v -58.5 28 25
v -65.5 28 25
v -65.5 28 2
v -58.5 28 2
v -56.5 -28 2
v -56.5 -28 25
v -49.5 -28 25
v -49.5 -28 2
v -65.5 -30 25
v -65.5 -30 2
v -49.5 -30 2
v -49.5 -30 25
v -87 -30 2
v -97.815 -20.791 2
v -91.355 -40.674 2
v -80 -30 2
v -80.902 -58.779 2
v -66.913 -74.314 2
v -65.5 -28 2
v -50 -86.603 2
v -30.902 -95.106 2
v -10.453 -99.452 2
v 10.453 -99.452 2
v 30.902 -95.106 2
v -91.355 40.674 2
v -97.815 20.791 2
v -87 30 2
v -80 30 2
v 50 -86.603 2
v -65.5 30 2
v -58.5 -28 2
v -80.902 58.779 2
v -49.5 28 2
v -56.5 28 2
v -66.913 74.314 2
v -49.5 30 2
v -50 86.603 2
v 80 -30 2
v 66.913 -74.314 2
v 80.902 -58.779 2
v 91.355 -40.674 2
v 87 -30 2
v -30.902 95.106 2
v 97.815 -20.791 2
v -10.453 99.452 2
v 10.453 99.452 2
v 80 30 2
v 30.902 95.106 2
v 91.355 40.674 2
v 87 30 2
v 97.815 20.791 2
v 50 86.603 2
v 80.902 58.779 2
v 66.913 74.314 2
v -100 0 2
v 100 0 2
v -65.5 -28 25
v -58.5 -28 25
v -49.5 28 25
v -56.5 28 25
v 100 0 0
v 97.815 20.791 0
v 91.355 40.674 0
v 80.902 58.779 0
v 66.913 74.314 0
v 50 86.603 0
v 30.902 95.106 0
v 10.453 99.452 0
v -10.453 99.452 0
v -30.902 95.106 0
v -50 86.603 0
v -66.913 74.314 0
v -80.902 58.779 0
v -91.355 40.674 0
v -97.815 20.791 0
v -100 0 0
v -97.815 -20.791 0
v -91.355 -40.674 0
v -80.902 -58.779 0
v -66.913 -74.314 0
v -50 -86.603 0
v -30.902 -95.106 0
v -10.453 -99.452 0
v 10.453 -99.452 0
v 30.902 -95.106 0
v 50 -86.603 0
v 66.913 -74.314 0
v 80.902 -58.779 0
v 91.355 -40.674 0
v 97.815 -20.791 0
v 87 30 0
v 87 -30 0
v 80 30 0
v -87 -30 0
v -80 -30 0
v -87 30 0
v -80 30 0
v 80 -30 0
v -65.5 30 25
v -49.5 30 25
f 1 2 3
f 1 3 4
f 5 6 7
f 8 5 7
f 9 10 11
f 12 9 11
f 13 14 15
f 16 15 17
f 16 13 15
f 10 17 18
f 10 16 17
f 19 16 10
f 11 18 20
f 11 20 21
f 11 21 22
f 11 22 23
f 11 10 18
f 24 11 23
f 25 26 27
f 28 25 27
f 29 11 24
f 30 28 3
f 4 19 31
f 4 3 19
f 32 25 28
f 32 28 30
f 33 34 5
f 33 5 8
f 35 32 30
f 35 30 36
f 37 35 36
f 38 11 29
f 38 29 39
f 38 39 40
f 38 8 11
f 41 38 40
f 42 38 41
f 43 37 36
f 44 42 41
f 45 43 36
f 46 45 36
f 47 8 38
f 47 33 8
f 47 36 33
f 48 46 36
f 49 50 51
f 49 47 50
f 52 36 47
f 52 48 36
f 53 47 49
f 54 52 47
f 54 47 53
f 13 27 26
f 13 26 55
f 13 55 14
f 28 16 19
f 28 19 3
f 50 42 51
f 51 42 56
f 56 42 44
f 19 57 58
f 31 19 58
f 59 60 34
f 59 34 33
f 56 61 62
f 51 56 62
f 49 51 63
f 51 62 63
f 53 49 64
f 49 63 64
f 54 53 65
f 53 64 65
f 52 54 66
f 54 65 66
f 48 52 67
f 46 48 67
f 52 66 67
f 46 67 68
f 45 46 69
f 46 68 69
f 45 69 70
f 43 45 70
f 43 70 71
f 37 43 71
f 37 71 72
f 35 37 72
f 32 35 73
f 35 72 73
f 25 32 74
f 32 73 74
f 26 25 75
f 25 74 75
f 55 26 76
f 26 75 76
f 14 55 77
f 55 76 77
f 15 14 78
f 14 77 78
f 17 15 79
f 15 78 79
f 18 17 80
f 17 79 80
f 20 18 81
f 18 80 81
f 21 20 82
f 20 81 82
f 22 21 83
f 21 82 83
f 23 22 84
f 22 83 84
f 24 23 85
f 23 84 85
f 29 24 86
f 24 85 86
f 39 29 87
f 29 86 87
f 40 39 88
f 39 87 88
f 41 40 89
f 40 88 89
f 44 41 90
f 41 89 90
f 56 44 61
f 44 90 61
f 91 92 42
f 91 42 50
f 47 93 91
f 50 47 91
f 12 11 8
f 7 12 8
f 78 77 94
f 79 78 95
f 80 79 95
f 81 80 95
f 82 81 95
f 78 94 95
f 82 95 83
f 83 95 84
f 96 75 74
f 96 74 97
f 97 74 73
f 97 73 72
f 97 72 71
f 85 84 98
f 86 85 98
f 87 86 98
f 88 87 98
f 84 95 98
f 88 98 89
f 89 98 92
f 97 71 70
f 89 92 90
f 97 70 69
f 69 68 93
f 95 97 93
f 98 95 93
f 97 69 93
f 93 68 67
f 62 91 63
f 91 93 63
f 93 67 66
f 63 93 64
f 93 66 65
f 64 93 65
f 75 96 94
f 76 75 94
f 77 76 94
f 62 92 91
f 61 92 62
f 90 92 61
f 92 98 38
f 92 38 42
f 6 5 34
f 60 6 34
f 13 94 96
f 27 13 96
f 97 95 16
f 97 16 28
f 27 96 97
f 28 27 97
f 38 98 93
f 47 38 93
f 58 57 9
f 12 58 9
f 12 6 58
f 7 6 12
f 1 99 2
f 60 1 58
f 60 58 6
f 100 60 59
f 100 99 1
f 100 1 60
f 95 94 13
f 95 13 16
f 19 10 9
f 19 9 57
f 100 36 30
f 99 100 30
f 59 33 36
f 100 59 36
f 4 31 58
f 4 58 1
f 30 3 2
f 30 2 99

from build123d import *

# Parameters (mm, degrees)
F0_R     = 100
F0_W     = 7
F0_H     = 60
F0_H_2   = 2
F0_W_2   = 2
F0_H_3   = 56
F1_DEPTH = 2
F2_DEPTH = 25


# Not quite as in the source:
# - a feature names something its author has since deleted; it is built from what else it names


with BuildPart() as f1:
    # F0 (on Top) → F1 (new body)
    with BuildSketch(Plane.XY):
        Circle(F0_R)
        with Locations((-83.5, 0)):
            Rectangle(F0_W, F0_H, mode=Mode.SUBTRACT)
        Polygon((-58.5, 30), (-56.5, 30), (-49.5, 30), (-49.5, 28), (-56.5, 28), (-56.5, -28), (-49.5, -28), (-49.5, -30), (-56.5, -30), (-58.5, -30), (-65.5, -30), (-65.5, -28), (-58.5, -28), (-58.5, 28), (-65.5, 28), (-65.5, 30), align=None, mode=Mode.SUBTRACT)
        with Locations((83.5, 0)):
            Rectangle(F0_W, F0_H, mode=Mode.SUBTRACT)
        with Locations((-62, -29)):
            Rectangle(F0_W, F0_H_2)
        with Locations((-57.5, -29)):
            Rectangle(F0_W_2, F0_H_2)
        with Locations((-53, -29)):
            Rectangle(F0_W, F0_H_2)
        with Locations((-57.5, 0)):
            Rectangle(F0_W_2, F0_H_3)
        with Locations((-62, 29)):
            Rectangle(F0_W, F0_H_2)
        with Locations((-57.5, 29)):
            Rectangle(F0_W_2, F0_H_2)
        with Locations((-53, 29)):
            Rectangle(F0_W, F0_H_2)
    extrude(amount=F1_DEPTH)

    # F0 (on Top) → F2 (join)
    with BuildSketch(Plane.XY):
        with Locations((-62, 29)):
            Rectangle(F0_W, F0_H_2)
        with Locations((-57.5, 29)):
            Rectangle(F0_W_2, F0_H_2)
        with Locations((-53, 29)):
            Rectangle(F0_W, F0_H_2)
        with Locations((-57.5, 0)):
            Rectangle(F0_W_2, F0_H_3)
        with Locations((-62, -29)):
            Rectangle(F0_W, F0_H_2)
        with Locations((-57.5, -29)):
            Rectangle(F0_W_2, F0_H_2)
        with Locations((-53, -29)):
            Rectangle(F0_W, F0_H_2)
    extrude(amount=F2_DEPTH)


solid = f1.part
